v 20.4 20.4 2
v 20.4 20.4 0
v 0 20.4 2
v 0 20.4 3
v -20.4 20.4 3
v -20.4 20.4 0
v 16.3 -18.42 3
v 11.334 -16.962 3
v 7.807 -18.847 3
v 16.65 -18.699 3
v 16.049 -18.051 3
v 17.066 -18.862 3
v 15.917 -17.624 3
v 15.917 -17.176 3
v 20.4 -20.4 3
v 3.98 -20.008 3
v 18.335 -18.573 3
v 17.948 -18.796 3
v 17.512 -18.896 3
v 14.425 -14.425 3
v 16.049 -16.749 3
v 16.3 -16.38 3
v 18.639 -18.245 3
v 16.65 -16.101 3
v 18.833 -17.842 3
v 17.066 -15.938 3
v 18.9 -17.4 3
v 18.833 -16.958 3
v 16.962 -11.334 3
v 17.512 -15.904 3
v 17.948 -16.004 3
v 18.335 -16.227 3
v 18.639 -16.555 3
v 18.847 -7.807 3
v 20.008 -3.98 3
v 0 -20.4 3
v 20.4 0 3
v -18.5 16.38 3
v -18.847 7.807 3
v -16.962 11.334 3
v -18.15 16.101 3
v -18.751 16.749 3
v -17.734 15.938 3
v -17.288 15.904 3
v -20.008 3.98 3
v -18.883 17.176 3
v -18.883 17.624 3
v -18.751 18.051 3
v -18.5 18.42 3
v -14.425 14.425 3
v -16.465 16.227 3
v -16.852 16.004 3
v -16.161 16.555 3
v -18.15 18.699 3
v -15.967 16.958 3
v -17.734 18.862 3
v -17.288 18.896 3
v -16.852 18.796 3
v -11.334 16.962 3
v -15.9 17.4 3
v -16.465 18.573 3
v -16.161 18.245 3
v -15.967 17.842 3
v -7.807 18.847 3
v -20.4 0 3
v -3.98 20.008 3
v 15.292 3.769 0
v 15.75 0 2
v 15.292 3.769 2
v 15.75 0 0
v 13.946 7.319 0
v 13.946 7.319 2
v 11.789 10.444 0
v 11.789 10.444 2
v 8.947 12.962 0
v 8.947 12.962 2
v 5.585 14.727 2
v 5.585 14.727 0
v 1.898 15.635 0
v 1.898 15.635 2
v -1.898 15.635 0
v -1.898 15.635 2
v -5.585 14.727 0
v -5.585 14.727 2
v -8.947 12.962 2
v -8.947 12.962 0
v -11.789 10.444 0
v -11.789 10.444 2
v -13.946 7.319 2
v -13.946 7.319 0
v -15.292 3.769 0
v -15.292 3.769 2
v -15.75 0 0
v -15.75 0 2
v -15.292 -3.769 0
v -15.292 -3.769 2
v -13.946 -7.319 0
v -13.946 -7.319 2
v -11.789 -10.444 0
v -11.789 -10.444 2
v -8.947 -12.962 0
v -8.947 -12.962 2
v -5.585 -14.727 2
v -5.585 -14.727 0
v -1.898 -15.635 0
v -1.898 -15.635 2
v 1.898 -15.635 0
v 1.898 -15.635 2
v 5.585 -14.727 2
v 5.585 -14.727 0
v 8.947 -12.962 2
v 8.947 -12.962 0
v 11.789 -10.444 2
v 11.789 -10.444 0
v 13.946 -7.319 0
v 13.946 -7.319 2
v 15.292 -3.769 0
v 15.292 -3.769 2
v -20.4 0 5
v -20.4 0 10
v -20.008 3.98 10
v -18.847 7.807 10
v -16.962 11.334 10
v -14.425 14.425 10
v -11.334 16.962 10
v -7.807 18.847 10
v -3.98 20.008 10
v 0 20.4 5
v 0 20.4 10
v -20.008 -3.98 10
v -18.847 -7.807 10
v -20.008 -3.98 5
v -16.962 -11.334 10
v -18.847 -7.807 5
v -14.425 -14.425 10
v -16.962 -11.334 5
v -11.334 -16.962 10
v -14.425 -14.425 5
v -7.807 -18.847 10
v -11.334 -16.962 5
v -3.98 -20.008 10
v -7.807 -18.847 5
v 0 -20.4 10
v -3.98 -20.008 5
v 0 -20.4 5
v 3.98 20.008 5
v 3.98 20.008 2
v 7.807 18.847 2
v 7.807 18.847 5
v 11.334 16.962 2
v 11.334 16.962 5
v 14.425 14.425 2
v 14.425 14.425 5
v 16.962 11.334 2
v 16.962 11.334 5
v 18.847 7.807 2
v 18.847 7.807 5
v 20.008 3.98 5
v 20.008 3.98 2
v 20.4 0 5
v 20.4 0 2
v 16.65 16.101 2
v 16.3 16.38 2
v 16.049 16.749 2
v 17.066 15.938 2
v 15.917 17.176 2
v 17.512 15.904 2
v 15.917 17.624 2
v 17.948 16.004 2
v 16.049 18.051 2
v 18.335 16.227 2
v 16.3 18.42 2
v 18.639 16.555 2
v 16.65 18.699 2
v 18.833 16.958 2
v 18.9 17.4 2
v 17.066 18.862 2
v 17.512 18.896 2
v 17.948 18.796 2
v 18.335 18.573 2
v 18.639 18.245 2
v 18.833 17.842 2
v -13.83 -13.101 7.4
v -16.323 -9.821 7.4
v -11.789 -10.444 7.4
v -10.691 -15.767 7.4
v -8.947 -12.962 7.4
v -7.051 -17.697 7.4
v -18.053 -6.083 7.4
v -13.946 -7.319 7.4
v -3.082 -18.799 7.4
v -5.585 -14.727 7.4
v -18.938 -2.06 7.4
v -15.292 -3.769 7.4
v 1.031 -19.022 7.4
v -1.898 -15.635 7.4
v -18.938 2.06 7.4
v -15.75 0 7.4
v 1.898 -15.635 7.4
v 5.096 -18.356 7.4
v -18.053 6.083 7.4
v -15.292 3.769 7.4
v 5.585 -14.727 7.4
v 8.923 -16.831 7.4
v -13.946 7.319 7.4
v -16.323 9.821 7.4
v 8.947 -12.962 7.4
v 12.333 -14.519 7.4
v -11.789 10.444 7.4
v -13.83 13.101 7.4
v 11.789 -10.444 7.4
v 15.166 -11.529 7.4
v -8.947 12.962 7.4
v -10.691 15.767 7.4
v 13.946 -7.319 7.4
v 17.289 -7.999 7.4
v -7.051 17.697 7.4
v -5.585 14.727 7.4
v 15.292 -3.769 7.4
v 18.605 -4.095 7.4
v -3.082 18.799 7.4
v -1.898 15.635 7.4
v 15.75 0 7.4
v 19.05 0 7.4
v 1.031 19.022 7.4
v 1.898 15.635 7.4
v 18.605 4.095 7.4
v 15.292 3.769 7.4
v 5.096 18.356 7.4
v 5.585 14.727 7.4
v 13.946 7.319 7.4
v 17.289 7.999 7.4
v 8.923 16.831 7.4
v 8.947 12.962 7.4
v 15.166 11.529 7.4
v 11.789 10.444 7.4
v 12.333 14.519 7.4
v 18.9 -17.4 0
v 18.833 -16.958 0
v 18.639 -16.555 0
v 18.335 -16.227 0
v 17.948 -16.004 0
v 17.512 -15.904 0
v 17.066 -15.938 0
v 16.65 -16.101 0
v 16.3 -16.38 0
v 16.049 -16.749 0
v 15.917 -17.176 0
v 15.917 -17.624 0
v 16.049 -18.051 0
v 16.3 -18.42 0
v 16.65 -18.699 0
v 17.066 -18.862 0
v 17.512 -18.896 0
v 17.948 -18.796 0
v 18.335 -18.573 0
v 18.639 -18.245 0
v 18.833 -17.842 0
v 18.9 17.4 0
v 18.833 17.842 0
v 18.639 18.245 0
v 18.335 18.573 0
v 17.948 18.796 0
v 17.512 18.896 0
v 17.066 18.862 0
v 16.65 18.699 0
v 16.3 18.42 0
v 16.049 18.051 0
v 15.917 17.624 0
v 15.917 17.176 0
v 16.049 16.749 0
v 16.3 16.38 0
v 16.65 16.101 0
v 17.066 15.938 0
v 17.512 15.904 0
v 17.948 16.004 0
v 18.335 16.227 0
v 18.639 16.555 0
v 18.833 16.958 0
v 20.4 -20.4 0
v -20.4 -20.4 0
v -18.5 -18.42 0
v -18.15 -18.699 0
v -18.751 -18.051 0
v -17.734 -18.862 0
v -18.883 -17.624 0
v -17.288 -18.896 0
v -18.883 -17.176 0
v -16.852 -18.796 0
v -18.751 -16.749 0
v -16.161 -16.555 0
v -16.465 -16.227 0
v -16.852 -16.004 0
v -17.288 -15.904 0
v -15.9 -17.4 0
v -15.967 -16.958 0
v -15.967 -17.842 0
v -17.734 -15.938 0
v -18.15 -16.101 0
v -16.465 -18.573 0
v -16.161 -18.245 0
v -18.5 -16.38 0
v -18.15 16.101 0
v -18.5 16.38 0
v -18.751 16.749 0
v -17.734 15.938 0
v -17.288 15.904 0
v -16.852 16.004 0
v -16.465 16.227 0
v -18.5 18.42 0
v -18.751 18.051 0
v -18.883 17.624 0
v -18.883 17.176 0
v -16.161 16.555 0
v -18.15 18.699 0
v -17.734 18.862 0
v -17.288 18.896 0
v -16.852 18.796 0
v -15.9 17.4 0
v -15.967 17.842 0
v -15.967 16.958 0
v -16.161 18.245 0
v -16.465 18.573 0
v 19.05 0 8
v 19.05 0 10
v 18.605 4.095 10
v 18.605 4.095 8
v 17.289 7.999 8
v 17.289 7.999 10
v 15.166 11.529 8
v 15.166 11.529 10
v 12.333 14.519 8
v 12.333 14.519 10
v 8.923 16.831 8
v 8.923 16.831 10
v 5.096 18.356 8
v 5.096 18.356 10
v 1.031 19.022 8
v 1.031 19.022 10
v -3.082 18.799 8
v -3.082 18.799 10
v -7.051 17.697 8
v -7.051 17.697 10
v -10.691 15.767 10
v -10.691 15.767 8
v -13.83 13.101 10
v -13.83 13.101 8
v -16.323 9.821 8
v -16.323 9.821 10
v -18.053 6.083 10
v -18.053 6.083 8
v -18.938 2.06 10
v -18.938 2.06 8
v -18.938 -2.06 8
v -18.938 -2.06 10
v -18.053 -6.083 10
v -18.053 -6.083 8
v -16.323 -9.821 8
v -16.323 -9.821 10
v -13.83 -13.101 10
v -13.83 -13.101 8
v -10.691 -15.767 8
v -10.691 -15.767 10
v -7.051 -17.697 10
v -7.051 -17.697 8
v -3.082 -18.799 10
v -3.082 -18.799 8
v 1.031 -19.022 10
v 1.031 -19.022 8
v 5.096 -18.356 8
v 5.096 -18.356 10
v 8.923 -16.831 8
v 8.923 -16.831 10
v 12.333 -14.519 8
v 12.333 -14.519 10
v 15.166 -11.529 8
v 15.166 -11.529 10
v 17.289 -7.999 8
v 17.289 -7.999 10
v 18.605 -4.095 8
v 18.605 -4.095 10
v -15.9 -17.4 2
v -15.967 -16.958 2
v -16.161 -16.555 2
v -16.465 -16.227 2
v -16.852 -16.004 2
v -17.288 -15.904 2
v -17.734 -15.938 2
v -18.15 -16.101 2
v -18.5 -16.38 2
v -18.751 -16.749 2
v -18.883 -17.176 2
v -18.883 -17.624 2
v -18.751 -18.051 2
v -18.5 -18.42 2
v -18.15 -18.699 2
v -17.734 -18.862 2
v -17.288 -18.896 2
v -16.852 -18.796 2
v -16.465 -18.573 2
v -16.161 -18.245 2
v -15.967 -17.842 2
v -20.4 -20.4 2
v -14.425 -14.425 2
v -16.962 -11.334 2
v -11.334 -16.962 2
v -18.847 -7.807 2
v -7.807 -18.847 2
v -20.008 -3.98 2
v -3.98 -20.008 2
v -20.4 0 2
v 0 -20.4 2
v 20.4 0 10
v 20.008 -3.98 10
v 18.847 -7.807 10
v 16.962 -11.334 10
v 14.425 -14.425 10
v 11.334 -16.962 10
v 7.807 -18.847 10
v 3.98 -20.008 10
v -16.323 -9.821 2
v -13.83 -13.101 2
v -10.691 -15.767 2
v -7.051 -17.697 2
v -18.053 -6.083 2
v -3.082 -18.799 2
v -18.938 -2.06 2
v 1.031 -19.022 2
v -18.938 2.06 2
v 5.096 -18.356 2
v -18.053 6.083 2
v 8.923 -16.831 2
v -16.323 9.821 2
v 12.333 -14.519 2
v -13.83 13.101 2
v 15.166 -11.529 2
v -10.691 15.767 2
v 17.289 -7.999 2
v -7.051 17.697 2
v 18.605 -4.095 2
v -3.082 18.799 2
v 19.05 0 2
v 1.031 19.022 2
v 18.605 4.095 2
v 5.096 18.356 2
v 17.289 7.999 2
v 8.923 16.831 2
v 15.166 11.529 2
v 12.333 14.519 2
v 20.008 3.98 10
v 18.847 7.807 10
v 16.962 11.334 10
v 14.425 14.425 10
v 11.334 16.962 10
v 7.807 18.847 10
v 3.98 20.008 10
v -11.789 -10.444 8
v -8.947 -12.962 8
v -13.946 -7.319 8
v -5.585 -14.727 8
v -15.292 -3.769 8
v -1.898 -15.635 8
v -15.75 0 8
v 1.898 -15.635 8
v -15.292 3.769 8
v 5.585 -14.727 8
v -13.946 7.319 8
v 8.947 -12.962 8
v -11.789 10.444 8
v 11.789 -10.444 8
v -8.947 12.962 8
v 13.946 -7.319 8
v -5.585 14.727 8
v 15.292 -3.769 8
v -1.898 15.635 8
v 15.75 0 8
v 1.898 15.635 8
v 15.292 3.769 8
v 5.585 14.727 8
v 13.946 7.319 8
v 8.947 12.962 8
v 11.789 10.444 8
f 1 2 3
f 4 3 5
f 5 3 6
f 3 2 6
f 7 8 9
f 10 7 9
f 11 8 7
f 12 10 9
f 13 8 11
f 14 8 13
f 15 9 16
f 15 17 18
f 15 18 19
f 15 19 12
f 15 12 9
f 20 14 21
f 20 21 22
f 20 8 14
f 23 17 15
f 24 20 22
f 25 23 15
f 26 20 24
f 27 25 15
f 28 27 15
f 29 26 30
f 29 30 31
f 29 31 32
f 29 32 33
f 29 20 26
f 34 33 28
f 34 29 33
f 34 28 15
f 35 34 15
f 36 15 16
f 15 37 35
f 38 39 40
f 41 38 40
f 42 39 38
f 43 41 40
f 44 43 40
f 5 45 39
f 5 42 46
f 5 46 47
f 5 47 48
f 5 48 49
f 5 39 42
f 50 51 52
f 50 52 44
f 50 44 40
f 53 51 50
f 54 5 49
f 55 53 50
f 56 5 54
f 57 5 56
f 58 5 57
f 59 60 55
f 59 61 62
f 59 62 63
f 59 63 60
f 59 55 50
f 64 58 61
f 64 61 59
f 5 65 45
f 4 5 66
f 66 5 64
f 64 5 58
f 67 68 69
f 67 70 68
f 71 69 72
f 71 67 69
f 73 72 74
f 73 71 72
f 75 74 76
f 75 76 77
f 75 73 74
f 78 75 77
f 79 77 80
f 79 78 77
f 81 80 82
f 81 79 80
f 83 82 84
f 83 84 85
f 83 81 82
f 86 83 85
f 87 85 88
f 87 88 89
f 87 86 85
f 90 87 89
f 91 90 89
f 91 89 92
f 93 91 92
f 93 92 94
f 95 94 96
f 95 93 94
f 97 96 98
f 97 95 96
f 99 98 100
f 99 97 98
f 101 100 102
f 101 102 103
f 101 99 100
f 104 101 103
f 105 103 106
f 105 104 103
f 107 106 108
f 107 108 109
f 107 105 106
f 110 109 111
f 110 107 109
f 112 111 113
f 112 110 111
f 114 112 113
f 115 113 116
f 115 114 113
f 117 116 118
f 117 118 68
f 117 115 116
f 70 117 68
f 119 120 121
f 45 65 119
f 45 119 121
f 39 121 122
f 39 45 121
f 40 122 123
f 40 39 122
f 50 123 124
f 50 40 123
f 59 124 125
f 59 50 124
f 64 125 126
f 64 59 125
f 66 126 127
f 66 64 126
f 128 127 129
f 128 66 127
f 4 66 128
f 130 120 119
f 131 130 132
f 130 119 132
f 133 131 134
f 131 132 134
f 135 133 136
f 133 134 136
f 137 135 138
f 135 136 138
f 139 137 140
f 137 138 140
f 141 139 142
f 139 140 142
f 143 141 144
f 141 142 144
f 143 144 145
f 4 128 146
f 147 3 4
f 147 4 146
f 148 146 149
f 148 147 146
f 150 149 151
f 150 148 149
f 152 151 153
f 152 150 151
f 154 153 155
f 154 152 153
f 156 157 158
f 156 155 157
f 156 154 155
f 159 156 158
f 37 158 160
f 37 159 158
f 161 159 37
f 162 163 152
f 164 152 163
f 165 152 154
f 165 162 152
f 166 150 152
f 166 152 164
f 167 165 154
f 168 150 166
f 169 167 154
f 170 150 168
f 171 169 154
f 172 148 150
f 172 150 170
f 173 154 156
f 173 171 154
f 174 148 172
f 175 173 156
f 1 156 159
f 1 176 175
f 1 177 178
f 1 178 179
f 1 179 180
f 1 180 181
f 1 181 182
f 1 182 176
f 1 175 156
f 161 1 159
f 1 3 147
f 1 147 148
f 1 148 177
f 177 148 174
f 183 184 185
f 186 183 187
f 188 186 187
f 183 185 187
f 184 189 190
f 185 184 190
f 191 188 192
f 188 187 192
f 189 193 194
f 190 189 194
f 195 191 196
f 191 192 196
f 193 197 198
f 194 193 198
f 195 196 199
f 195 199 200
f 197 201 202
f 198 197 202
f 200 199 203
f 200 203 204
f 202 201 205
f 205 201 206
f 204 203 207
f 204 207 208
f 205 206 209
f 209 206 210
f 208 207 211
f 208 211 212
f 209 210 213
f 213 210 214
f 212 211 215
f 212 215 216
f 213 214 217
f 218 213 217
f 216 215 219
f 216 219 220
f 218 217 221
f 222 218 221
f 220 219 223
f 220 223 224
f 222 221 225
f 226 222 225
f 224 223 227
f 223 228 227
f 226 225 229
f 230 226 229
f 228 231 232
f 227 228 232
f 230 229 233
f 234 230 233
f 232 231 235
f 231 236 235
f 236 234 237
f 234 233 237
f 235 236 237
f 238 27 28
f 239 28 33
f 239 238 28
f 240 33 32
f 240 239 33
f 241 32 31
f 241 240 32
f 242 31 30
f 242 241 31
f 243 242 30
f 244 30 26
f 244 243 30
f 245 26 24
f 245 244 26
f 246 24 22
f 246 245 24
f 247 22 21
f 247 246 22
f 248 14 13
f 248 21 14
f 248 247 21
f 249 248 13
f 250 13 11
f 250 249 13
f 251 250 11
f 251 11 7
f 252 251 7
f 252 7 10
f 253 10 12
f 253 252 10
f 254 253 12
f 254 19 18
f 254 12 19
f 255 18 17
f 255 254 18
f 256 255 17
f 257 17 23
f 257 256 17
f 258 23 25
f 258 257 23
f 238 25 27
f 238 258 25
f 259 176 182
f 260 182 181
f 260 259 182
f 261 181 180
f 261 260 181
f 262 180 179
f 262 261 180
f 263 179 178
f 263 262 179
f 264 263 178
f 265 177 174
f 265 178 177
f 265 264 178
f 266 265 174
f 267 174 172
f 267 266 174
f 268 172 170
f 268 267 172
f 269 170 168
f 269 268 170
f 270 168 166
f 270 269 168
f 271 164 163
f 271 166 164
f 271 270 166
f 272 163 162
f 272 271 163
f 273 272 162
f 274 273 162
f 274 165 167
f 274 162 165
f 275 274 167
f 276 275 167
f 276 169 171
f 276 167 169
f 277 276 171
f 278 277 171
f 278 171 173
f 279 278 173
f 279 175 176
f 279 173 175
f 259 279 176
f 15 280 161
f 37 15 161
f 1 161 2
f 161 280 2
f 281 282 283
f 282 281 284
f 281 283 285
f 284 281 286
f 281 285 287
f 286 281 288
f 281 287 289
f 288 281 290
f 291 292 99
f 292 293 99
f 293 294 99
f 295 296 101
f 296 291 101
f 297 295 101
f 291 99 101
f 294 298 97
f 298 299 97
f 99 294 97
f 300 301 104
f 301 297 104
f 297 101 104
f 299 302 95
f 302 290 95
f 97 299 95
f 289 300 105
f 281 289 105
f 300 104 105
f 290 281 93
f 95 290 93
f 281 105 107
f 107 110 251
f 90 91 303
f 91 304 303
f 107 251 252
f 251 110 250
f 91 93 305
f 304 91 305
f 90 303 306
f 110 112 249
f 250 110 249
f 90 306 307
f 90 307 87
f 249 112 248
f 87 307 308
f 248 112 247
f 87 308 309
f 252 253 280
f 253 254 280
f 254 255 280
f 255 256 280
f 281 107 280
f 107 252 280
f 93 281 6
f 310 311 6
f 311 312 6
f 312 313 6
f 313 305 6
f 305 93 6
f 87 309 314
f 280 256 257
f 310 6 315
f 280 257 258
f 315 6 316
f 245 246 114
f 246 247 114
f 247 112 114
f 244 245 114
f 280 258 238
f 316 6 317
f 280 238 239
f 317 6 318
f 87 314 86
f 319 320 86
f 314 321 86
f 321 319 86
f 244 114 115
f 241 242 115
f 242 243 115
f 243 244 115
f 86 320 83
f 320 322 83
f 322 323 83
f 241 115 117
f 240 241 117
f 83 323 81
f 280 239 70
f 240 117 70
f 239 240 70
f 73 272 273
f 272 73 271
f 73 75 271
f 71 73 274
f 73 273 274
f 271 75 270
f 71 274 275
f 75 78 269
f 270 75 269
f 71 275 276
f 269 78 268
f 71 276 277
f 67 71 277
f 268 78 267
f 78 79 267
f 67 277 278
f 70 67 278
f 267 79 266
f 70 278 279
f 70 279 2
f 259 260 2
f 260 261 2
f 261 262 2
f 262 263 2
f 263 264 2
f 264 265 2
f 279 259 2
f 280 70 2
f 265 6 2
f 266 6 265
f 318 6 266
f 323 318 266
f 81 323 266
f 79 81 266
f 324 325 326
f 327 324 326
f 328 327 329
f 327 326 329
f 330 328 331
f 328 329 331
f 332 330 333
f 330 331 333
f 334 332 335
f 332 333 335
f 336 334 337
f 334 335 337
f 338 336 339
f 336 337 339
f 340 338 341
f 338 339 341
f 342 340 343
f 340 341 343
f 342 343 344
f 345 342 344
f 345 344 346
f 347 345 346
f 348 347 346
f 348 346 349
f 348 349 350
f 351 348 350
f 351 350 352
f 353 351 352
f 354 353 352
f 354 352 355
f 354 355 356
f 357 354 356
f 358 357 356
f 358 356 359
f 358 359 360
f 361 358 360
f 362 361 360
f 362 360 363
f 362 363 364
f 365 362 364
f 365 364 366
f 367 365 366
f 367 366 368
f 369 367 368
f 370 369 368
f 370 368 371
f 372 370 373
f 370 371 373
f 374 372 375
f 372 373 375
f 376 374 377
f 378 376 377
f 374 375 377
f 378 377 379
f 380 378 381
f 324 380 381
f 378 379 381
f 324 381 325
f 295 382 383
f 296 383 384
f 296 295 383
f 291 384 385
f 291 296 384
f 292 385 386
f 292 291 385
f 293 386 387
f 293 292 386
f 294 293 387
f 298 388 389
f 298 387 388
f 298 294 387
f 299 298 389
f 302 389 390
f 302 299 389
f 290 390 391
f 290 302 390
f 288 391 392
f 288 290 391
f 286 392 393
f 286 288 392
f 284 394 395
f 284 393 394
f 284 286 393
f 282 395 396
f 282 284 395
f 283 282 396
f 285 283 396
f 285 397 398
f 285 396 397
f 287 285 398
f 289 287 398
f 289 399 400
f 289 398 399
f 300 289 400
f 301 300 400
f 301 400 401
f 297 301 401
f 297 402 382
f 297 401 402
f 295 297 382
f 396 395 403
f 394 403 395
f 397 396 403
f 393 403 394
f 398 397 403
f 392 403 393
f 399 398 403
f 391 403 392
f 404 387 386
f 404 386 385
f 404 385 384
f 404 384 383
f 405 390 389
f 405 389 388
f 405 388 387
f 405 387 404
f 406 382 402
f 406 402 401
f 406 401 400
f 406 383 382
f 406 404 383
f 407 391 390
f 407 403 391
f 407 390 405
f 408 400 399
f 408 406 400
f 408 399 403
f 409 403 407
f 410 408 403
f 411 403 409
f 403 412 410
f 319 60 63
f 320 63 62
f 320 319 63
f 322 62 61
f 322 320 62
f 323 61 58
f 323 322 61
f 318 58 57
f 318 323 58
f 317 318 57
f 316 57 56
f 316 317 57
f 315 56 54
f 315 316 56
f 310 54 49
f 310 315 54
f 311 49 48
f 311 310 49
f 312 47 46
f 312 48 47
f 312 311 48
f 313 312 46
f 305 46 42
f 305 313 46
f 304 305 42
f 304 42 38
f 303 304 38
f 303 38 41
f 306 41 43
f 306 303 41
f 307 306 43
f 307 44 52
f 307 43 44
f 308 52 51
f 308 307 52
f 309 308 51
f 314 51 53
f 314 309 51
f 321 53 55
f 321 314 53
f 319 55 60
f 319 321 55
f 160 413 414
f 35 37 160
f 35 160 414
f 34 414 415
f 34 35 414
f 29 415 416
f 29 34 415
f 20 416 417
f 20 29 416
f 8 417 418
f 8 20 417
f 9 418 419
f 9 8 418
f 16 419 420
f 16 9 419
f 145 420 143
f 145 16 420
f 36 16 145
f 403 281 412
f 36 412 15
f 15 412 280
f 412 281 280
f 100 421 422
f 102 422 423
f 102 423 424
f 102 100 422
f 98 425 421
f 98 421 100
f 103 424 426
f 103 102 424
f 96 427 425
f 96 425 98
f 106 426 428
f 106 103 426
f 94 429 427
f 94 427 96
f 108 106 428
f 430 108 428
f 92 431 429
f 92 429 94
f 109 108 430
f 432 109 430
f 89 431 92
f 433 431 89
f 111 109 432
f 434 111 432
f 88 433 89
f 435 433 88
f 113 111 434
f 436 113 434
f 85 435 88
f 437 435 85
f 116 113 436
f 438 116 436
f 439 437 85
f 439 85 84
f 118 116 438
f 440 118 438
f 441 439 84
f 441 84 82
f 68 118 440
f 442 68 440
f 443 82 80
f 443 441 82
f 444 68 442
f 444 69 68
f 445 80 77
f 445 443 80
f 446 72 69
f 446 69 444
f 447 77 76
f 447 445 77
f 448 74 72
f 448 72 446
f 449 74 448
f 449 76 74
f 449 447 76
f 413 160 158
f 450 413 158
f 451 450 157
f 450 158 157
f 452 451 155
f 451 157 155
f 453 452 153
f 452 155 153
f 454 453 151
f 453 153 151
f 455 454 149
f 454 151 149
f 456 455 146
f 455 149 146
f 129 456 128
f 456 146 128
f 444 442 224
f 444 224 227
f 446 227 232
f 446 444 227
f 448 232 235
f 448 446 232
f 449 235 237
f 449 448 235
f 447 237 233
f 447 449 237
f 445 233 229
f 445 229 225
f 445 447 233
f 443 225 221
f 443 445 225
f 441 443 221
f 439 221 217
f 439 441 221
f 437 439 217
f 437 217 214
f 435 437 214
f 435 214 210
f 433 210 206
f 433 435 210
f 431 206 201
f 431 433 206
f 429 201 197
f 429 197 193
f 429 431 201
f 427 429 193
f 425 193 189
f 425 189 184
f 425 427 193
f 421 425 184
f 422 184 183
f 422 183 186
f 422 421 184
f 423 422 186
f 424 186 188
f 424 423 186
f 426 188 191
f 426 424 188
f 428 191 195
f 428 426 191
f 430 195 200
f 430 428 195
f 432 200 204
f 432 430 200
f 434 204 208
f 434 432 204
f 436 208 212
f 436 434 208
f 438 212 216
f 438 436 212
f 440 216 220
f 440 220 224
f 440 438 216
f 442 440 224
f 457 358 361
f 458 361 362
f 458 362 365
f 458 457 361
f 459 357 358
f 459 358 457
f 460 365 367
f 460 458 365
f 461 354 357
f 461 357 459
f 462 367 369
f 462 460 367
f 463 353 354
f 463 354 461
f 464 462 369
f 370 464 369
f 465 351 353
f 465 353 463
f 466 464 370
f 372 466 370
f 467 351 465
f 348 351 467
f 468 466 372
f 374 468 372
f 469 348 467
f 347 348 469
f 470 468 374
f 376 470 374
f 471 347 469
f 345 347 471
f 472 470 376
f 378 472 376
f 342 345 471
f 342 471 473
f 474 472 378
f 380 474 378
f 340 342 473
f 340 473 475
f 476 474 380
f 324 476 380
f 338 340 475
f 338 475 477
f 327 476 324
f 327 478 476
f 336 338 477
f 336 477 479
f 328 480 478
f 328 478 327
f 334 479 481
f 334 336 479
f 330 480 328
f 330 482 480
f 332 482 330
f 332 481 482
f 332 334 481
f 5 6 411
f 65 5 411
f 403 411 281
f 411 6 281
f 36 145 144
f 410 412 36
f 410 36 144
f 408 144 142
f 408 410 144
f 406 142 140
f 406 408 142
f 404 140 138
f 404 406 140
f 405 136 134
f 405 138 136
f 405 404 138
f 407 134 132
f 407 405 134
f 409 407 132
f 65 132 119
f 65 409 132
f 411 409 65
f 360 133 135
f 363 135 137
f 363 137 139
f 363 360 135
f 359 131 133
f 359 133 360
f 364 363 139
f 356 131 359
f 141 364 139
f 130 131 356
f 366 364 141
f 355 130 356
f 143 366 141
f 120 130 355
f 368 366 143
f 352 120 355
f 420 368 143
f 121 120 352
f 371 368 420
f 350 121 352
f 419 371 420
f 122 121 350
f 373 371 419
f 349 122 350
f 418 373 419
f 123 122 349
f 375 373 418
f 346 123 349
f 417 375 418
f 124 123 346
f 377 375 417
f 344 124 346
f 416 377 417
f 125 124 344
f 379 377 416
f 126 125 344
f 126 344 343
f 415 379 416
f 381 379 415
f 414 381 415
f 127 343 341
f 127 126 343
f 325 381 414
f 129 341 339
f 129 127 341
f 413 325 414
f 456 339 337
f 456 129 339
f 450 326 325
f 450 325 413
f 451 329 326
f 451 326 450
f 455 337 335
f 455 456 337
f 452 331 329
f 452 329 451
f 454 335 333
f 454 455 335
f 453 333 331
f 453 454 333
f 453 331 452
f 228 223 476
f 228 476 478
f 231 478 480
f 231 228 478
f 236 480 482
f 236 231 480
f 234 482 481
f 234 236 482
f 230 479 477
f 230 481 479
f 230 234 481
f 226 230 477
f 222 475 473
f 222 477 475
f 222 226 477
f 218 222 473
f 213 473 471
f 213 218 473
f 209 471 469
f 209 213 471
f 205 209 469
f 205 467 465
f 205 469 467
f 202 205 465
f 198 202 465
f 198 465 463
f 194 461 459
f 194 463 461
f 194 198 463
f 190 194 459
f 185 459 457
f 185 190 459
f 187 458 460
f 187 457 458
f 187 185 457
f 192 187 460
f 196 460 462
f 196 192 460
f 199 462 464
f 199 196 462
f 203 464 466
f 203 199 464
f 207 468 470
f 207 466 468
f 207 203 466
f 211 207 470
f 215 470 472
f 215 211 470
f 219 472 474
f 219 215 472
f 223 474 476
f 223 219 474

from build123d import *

# Parameters (mm, degrees)
SKETCH2_R               = 20.4
SKETCH2_R_2             = 15.75
SKETCH2_R_3             = 1.5
BOSS_EXTRUDE1_DEPTH     = 5
BOSS_EXTRUDE2_START     = 5
SKETCH2_4_R             = 20.4
SKETCH2_4_R_2           = 15.75
SKETCH2_4_R_3           = 1.5
BOSS_EXTRUDE2_DEPTH     = 6
SKETCH4_R               = 19.05
CUT_EXTRUDE2_DEPTH      = 3
CUT_EXTRUDE3_START      = -6
SKETCH5_R               = 19.05
SKETCH5_R_2             = 15.75
CUT_EXTRUDE3_DEPTH      = 5.4
CUT_EXTRUDE4_START      = -3
CUT_EXTRUDE4_DEPTH      = 3
CUT_EXTRUDE5_START      = -1
SKETCH7_R               = 19.05
CUT_EXTRUDE5_DEPTH      = 1
CUT_EXTRUDE6_DEPTH      = 30.938603842
CUT_EXTRUDE6_DEPTH_BACK = 5


with BuildPart() as part:
    # Sketch2 → Boss-Extrude1 (new body)
    # profile 1 of 5: a face of its own
    with BuildSketch(Plane.XY):
        Circle(SKETCH2_R)
        Circle(SKETCH2_R_2, mode=Mode.SUBTRACT)
    # profile 2 of 5: a face of its own
    with BuildSketch(Plane.XY):
        with BuildLine():
            Line((-20.4, 20.4), (-20.4, -3.8e-08))
            ThreePointArc((-20.4, -3.8e-08), (-14.424978339, 14.424978334), (3.1e-08, 20.4))
            Line((3.1e-08, 20.4), (-20.4, 20.4))
        make_face()
        with Locations((-17.4, 17.4)):
            Circle(SKETCH2_R_3, mode=Mode.SUBTRACT)
    # profile 3 of 5: a face of its own
    with BuildSketch(Plane.XY):
        with BuildLine():
            ThreePointArc((3.1e-08, 20.4), (14.424978347, 14.424978325), (20.4, 0))
            Line((20.4, 0), (20.4, 20.4))
            Line((20.4, 20.4), (3.1e-08, 20.4))
        make_face()
        with Locations((17.4, 17.4)):
            Circle(SKETCH2_R_3, mode=Mode.SUBTRACT)
    # profile 4 of 5: a face of its own
    with BuildSketch(Plane.XY):
        with BuildLine():
            ThreePointArc((20.4, 0), (14.424978335, -14.424978337), (-2e-09, -20.4))
            Line((-2e-09, -20.4), (20.4, -20.4))
            Line((20.4, -20.4), (20.4, 0))
        make_face()
        with Locations((17.4, -17.4)):
            Circle(SKETCH2_R_3, mode=Mode.SUBTRACT)
    # profile 5 of 5: a face of its own
    with BuildSketch(Plane.XY):
        with BuildLine():
            Line((-20.4, -3.8e-08), (-20.4, -20.4))
            Line((-20.4, -20.4), (-2e-09, -20.4))
            ThreePointArc((-2e-09, -20.4), (-14.424978323, -14.424978349), (-20.4, -3.8e-08))
        make_face()
        with Locations((-17.4, -17.4)):
            Circle(SKETCH2_R_3, mode=Mode.SUBTRACT)
    extrude(amount=BOSS_EXTRUDE1_DEPTH)

    # Sketch2<4> → Boss-Extrude2 (add)
    # profile 1 of 3: a face of its own
    with BuildSketch(Plane.XY.offset(BOSS_EXTRUDE2_START)):
        Circle(SKETCH2_4_R)
        Circle(SKETCH2_4_R_2, mode=Mode.SUBTRACT)
    # profile 2 of 3: a face of its own
    with BuildSketch(Plane.XY.offset(BOSS_EXTRUDE2_START)):
        with BuildLine():
            Line((-20.4, 20.4), (-20.4, -3.8e-08))
            ThreePointArc((-20.4, -3.8e-08), (-14.424978339, 14.424978334), (3.1e-08, 20.4))
            Line((3.1e-08, 20.4), (-20.4, 20.4))
        make_face()
        with Locations((-17.4, 17.4)):
            Circle(SKETCH2_4_R_3, mode=Mode.SUBTRACT)
    # profile 3 of 3: a face of its own
    with BuildSketch(Plane.XY.offset(BOSS_EXTRUDE2_START)):
        with BuildLine():
            ThreePointArc((20.4, 0), (14.424978335, -14.424978337), (-2e-09, -20.4))
            Line((-2e-09, -20.4), (20.4, -20.4))
            Line((20.4, -20.4), (20.4, 0))
        make_face()
        with Locations((17.4, -17.4)):
            Circle(SKETCH2_4_R_3, mode=Mode.SUBTRACT)
    extrude(amount=BOSS_EXTRUDE2_DEPTH)

    # Sketch4 → Cut-Extrude2 (cut)
    with BuildSketch(Plane.XY.offset(11)):
        Circle(SKETCH4_R)
    extrude(amount=-CUT_EXTRUDE2_DEPTH, mode=Mode.SUBTRACT)

    # Sketch5 → Cut-Extrude3 (cut)
    with BuildSketch(Plane.XY.offset(8).offset(CUT_EXTRUDE3_START)):
        Circle(SKETCH5_R)
        with Locations(Location((0, 0, 0), (0, 0, 180))):
            Circle(SKETCH5_R_2, mode=Mode.SUBTRACT)
    extrude(amount=CUT_EXTRUDE3_DEPTH, mode=Mode.SUBTRACT)

    # Sketch6 → Cut-Extrude4 (cut)
    with BuildSketch(Plane.XY.offset(5).offset(CUT_EXTRUDE4_START)):
        with BuildLine():
            Line((20.4, 0), (20.4, 20.4))
            Line((20.4, 20.4), (0, 20.4))
            ThreePointArc((0, 20.4), (14.424978336, 14.424978336), (20.4, 0))
        make_face()
        with BuildLine():
            Line((-20.4, 0), (-20.4, -20.4))
            Line((-20.4, -20.4), (0, -20.4))
            ThreePointArc((0, -20.4), (-14.424978336, -14.424978336), (-20.4, 0))
        make_face()
    extrude(amount=CUT_EXTRUDE4_DEPTH, mode=Mode.SUBTRACT)

    # Sketch7 → Cut-Extrude5 (cut)
    with BuildSketch(Plane.XY.offset(11).offset(CUT_EXTRUDE5_START)):
        with BuildLine():
            Line((20.4, -20.4), (20.4, 0))
            ThreePointArc((20.4, 0), (14.424978336, 14.424978336), (0, 20.4))
            Line((0, 20.4), (-20.4, 20.4))
            Line((-20.4, 20.4), (-20.4, 0))
            ThreePointArc((-20.4, 0), (-14.424978336, -14.424978336), (0, -20.4))
            Line((0, -20.4), (20.4, -20.4))
        make_face()
        Circle(SKETCH7_R, mode=Mode.SUBTRACT)
    extrude(amount=CUT_EXTRUDE5_DEPTH, mode=Mode.SUBTRACT)

    # Sketch8 → Cut-Extrude6 (cut, two sides: drawn at the far end of the back side and taken through both)
    with BuildSketch(Plane.XY.offset(8).offset(-CUT_EXTRUDE6_DEPTH_BACK)):
        with BuildLine():
            Line((-20.4, 20.4), (-20.4, 0))
            ThreePointArc((-20.4, 0), (-14.424978336, 14.424978336), (0, 20.4))
            Line((0, 20.4), (-20.4, 20.4))
        make_face()
        with BuildLine():
            ThreePointArc((20.4, 0), (14.424978336, -14.424978336), (0, -20.4))
            Line((0, -20.4), (20.4, -20.4))
            Line((20.4, -20.4), (20.4, 0))
        make_face()
    extrude(amount=CUT_EXTRUDE6_DEPTH + CUT_EXTRUDE6_DEPTH_BACK, mode=Mode.SUBTRACT)


solid = part.part
